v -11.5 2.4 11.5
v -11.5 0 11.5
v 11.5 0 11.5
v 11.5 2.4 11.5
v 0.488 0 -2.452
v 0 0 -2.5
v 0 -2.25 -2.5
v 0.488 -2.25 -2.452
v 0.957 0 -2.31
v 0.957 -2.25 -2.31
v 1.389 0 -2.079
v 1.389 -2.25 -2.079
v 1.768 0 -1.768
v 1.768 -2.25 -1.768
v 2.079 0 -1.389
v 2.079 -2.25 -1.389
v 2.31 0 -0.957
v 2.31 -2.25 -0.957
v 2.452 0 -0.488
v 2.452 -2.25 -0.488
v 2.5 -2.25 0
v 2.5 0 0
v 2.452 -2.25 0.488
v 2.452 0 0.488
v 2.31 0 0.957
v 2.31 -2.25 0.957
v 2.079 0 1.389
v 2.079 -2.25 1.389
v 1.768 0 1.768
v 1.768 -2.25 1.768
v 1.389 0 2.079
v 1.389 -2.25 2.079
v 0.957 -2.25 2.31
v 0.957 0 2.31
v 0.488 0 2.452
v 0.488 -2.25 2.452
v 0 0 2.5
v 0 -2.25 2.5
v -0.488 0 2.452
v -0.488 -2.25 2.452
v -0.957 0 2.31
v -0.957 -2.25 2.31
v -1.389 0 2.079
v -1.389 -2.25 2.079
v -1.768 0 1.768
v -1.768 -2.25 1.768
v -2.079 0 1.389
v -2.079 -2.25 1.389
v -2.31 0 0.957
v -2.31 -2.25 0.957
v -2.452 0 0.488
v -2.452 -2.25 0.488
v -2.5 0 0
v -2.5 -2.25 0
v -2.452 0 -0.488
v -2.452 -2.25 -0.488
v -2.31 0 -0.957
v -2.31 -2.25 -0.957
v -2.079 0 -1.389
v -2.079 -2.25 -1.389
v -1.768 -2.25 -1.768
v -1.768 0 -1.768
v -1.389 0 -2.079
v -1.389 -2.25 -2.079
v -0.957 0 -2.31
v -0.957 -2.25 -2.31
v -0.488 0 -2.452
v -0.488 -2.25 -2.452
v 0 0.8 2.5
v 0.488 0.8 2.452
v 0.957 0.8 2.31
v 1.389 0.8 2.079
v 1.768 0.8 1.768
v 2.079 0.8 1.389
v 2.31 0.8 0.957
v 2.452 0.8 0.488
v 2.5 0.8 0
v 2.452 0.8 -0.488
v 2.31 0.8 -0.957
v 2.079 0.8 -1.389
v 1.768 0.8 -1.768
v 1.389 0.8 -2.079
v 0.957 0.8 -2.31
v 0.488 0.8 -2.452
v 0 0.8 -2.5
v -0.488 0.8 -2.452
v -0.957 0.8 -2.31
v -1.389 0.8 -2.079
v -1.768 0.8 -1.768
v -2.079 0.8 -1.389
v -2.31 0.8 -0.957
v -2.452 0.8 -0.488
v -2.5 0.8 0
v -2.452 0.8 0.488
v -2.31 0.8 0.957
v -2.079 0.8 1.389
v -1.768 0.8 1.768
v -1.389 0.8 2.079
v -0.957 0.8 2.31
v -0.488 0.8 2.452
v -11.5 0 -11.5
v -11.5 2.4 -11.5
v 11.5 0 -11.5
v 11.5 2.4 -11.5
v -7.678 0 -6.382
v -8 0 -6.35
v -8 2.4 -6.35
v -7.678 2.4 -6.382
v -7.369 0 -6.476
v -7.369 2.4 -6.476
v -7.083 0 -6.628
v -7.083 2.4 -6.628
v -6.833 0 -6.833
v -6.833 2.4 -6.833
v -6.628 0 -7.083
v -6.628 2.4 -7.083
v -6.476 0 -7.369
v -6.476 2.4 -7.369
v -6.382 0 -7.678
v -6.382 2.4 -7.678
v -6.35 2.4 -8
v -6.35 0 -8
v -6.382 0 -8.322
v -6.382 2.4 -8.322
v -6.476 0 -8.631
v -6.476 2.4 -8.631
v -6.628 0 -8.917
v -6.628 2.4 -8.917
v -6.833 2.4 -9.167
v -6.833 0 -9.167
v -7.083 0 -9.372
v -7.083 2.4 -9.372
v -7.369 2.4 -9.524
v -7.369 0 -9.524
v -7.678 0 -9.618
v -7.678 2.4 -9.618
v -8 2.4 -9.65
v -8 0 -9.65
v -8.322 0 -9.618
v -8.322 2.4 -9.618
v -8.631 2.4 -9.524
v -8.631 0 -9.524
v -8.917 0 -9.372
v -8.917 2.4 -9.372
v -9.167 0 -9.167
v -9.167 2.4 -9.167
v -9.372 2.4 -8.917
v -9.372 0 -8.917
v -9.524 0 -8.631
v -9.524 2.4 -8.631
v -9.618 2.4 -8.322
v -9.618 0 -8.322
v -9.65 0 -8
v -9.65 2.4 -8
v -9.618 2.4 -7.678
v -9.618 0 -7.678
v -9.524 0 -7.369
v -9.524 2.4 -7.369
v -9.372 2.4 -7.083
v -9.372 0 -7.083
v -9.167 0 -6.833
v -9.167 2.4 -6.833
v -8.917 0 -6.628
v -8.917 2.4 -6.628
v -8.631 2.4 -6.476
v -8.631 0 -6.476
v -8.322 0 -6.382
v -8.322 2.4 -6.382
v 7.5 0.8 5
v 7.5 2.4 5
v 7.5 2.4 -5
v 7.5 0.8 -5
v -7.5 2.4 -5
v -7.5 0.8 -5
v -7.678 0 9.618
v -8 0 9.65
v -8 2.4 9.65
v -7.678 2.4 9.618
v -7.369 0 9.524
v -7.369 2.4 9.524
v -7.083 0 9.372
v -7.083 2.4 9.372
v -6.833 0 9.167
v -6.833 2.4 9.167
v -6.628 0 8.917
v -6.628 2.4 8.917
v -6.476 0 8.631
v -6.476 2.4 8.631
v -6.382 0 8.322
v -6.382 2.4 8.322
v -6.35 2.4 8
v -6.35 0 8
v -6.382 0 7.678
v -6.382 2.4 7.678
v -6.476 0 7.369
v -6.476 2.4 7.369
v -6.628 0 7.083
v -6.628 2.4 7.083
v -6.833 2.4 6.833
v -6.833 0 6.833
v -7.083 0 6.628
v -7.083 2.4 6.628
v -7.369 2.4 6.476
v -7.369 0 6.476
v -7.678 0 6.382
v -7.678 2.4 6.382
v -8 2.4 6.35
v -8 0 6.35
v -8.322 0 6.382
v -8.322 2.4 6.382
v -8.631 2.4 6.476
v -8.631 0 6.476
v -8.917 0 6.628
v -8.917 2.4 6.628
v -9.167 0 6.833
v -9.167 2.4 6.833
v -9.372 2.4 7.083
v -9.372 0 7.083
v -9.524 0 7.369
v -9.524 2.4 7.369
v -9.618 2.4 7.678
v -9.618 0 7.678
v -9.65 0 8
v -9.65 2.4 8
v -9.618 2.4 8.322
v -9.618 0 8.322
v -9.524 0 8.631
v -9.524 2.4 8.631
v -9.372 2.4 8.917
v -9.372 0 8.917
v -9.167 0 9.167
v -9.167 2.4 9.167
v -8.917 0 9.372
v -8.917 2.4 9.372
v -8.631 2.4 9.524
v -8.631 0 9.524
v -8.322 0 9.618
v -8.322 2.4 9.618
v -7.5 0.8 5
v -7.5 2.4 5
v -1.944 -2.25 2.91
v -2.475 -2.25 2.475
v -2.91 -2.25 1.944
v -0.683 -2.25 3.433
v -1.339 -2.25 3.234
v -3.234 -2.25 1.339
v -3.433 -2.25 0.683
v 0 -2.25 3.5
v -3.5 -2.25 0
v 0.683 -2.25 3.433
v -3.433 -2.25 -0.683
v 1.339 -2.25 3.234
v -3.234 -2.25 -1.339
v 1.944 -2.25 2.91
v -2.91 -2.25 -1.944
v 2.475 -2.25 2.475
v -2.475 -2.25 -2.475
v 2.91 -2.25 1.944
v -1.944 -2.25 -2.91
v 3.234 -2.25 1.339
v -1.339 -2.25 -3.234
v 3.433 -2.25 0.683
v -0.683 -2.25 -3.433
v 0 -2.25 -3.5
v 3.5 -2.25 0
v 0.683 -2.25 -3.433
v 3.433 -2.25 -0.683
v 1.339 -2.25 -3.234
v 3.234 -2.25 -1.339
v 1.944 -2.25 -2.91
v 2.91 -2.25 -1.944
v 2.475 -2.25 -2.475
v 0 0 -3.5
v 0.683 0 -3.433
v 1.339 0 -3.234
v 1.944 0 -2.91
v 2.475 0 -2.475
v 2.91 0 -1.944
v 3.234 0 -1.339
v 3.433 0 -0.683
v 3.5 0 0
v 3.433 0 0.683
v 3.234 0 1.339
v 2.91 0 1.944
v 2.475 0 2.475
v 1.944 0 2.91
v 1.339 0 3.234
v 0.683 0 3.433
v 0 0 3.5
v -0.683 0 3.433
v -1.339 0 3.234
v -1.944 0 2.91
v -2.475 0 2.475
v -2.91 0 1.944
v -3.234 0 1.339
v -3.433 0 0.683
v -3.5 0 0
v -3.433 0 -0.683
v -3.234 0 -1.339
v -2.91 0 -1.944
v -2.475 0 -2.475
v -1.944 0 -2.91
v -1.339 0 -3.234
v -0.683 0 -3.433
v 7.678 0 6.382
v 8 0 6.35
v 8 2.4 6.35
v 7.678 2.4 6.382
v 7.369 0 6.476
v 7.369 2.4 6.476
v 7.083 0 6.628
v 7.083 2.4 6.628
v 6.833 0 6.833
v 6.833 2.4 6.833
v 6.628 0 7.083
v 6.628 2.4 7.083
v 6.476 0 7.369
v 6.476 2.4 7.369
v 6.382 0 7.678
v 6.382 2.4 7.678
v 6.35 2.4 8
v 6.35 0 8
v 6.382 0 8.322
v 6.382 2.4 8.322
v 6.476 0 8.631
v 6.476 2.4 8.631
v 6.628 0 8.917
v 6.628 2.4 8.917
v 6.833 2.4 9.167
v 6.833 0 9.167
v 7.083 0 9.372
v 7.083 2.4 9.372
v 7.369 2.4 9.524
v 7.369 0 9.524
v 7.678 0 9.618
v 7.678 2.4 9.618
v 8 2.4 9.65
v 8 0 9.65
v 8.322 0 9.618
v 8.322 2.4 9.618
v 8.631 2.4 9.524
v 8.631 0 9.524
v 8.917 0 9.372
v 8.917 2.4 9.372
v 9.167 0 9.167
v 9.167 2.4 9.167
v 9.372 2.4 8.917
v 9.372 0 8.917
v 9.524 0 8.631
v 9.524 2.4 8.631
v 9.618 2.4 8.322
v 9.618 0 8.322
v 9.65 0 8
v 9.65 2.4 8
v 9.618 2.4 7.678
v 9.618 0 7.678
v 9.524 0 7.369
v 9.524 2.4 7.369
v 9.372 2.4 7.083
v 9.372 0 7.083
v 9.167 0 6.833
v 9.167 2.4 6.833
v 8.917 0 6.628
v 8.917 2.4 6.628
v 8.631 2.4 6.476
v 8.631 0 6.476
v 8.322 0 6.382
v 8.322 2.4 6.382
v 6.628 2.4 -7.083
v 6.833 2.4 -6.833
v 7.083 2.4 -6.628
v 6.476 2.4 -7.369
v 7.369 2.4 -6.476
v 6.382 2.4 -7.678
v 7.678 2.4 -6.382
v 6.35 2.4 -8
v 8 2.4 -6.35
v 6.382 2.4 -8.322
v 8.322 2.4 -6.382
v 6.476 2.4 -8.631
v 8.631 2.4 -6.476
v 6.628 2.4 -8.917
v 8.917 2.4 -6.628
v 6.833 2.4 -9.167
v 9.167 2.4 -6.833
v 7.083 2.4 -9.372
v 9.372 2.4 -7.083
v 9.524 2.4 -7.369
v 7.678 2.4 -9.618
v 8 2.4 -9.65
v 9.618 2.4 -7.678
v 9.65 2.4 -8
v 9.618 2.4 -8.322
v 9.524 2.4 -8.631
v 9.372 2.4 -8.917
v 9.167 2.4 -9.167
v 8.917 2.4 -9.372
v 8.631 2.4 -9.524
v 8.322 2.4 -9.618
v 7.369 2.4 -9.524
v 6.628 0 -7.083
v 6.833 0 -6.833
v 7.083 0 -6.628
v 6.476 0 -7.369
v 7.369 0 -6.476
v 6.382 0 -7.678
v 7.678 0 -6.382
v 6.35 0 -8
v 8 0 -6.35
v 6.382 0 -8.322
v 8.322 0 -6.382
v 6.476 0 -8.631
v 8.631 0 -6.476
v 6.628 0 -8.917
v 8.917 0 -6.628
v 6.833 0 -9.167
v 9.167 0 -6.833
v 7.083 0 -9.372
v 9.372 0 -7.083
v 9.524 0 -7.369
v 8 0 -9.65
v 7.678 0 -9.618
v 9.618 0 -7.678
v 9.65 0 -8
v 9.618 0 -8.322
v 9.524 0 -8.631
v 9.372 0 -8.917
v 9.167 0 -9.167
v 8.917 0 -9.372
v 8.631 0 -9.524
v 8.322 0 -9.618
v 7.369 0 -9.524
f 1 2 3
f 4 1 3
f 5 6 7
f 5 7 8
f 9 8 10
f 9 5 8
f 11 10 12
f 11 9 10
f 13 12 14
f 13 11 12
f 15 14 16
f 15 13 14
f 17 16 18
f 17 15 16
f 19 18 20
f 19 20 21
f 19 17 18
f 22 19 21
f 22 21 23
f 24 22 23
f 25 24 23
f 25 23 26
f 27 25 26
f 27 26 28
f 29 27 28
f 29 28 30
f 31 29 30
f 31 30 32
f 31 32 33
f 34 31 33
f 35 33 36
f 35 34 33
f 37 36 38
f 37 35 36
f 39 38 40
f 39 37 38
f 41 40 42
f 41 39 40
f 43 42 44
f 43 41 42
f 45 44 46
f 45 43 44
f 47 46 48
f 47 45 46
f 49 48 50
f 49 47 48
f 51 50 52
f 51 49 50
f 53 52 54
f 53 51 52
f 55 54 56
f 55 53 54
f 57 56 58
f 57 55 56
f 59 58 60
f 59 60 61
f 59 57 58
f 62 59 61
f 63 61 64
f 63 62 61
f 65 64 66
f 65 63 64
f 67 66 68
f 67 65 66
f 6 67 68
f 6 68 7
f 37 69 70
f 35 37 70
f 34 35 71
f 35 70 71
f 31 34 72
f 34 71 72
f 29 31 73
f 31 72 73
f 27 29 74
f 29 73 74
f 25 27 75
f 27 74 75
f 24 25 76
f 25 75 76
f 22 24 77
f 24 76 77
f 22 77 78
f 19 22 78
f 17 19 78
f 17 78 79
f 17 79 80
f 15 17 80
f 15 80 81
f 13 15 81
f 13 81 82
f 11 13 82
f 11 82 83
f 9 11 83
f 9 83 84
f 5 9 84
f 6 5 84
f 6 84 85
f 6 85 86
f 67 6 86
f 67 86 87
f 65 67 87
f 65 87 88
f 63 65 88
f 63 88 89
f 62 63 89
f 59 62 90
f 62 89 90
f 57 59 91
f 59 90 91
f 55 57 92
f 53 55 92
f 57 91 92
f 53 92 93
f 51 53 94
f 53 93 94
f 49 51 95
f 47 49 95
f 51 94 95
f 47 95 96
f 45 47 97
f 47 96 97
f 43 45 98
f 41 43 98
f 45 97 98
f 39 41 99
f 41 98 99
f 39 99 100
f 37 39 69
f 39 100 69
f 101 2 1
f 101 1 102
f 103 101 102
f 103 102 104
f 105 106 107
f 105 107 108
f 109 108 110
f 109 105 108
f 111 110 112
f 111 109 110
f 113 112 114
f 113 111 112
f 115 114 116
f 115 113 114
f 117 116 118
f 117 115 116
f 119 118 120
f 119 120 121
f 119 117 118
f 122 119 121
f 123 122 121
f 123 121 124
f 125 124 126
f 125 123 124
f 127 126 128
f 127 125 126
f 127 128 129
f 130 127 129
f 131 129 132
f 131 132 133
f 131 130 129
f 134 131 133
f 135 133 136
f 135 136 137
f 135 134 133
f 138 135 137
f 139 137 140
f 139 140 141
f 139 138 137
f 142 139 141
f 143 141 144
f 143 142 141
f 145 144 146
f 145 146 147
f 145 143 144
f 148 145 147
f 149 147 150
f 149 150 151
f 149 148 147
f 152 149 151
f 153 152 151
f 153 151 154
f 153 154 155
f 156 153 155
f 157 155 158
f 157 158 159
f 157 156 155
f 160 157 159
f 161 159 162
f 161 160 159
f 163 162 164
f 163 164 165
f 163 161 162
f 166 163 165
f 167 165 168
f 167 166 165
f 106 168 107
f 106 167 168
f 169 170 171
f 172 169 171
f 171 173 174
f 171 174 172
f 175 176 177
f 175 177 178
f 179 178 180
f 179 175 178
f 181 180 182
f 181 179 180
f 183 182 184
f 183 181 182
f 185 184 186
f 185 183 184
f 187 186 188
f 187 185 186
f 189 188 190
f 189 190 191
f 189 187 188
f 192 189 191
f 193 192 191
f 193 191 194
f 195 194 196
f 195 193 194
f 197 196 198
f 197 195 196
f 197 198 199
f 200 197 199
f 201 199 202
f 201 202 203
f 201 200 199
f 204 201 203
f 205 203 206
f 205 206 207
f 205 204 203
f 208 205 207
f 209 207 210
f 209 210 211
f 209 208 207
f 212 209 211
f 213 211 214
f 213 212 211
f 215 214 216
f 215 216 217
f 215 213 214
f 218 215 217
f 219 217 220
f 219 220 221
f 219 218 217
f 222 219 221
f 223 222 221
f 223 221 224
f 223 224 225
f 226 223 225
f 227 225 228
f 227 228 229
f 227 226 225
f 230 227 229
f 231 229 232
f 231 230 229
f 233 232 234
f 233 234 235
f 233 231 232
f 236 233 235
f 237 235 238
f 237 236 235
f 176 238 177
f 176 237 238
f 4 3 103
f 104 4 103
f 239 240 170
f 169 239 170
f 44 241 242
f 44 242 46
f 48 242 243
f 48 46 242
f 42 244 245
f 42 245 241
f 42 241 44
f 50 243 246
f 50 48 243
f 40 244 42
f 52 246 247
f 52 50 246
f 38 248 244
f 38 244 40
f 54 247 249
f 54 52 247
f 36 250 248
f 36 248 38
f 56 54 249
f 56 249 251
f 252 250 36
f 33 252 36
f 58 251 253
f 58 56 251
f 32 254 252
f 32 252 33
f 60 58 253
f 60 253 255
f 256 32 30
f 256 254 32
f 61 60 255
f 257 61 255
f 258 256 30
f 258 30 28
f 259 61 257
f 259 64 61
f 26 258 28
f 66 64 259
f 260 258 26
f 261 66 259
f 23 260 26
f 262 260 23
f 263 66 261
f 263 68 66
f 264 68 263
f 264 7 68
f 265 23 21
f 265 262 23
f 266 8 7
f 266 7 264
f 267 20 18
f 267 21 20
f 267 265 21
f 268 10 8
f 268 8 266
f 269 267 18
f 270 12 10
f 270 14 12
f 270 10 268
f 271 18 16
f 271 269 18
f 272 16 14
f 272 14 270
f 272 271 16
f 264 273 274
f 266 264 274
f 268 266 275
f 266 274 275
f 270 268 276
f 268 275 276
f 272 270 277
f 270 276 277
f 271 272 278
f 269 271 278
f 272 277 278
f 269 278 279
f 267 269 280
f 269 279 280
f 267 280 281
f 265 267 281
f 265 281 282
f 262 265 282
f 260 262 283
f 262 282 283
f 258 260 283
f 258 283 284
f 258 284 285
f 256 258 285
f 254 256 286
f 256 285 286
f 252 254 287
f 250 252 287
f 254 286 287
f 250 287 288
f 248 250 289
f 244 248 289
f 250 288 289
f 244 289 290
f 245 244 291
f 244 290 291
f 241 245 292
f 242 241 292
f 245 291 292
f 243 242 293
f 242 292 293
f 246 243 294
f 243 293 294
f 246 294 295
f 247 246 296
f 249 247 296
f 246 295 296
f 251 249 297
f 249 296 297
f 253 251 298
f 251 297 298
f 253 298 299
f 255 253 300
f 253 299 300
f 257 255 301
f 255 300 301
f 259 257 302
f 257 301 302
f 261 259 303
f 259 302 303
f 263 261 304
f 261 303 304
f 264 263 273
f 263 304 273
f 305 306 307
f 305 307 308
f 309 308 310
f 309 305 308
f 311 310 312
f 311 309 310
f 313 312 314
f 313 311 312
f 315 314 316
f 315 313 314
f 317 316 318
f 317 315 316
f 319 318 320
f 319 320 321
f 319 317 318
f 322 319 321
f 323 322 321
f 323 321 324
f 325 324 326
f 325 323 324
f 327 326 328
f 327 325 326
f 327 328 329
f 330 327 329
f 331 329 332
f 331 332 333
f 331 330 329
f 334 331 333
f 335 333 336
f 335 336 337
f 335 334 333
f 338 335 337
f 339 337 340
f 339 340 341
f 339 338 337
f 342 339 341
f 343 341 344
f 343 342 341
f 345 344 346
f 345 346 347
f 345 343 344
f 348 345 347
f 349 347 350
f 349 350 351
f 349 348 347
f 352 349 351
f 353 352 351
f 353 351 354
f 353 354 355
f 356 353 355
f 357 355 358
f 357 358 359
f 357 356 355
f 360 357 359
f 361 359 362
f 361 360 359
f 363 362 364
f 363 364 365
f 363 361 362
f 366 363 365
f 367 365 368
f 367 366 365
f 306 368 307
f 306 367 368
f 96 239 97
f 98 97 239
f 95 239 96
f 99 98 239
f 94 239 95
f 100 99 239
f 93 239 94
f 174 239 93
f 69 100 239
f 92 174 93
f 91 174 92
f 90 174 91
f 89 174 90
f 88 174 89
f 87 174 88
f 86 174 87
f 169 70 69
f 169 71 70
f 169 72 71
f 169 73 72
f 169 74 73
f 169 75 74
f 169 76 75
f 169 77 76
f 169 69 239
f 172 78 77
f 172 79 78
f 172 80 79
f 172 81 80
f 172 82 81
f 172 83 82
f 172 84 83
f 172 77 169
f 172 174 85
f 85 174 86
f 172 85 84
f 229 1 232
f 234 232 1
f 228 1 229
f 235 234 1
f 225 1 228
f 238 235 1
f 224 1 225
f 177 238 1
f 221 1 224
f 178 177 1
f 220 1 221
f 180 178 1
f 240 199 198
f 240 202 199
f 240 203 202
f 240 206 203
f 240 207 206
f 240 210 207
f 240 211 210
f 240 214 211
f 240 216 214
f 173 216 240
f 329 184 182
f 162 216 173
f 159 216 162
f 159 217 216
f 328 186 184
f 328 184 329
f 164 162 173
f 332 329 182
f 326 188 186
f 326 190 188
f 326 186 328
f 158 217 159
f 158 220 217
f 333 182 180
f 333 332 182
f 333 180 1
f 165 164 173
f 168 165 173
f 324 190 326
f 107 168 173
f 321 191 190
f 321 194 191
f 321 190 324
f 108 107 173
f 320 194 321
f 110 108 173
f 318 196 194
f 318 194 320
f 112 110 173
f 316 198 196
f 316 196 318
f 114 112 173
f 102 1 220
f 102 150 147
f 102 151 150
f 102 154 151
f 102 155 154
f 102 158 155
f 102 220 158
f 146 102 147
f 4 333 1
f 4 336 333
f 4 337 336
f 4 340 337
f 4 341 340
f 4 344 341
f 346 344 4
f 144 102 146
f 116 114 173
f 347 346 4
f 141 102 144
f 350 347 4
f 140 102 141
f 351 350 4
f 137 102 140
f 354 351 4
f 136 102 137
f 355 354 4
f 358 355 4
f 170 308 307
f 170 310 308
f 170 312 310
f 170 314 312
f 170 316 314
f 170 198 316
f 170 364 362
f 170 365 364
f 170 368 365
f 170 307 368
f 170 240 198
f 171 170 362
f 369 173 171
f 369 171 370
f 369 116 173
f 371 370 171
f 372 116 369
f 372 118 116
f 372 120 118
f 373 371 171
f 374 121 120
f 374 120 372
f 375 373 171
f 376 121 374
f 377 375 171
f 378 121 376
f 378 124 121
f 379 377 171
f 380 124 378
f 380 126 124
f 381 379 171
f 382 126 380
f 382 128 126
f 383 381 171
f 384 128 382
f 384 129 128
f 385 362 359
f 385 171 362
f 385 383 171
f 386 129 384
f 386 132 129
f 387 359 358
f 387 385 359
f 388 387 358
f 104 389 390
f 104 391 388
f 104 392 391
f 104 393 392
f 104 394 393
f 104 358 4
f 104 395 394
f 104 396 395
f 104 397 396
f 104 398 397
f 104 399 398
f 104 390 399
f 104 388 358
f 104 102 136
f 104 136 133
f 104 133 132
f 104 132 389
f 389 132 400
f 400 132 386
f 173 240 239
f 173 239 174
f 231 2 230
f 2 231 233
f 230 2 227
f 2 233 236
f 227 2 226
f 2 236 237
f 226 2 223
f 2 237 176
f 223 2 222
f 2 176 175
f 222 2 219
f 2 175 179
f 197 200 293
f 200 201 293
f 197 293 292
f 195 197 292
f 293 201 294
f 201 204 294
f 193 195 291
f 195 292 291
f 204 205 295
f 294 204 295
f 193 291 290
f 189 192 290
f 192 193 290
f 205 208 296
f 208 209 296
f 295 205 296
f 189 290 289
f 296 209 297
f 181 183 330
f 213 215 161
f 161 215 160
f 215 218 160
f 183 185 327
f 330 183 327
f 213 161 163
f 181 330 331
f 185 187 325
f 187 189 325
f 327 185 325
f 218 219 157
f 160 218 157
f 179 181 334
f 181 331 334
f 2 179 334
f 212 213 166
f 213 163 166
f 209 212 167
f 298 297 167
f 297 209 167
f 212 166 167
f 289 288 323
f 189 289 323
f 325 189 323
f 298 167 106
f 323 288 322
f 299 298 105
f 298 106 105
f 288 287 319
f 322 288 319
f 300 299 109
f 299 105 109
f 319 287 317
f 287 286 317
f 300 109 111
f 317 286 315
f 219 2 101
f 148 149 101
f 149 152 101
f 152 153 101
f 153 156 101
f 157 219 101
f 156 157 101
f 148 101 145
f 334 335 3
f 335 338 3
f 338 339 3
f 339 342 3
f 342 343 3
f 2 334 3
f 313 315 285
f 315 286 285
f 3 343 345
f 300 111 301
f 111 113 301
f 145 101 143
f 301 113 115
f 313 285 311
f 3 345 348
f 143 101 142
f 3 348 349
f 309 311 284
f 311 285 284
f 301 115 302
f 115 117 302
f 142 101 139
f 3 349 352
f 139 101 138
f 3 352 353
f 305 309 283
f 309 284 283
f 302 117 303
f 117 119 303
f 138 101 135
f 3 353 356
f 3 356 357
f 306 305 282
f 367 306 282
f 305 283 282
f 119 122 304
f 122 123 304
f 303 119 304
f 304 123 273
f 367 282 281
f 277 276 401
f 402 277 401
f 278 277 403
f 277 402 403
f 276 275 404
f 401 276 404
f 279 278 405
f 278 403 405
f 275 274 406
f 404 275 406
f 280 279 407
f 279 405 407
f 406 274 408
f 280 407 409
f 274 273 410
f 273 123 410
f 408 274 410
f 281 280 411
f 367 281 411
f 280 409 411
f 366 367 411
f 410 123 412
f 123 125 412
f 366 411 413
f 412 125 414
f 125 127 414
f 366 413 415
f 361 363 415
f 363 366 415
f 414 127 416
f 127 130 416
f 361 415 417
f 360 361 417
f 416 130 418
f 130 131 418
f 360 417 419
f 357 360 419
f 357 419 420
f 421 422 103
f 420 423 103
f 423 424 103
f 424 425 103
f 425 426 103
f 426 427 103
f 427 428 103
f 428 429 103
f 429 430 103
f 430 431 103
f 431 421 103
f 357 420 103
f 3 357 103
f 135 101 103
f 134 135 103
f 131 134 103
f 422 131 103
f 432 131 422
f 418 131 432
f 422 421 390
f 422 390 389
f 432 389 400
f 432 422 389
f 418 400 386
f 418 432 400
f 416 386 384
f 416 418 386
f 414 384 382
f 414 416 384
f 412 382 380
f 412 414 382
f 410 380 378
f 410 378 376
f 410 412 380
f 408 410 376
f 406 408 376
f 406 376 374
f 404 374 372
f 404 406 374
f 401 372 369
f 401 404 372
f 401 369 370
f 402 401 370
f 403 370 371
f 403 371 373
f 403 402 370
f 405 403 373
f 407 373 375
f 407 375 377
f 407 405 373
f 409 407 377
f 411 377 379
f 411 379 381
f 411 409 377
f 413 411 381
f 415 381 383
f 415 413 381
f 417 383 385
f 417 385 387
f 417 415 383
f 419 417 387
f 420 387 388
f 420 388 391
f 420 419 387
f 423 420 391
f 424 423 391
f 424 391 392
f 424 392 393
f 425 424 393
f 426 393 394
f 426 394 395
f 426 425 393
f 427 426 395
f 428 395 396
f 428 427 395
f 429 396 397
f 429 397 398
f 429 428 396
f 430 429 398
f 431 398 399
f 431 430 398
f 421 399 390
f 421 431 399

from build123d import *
from build123d.topology import SkipClean

# Parameters (mm, degrees)
SKETCH1_W           = 23
SKETCH1_H           = 23
SKETCH1_R           = 1.65
BOSS_EXTRUDE1_DEPTH = 2.4
CUT_EXTRUDE1_REACH  = 18.44
SKETCH2_R           = 2.5
SKETCH3_W           = 15
SKETCH3_H           = 10
CUT_EXTRUDE2_DEPTH  = 1.6
SKETCH4_R           = 3.5
SKETCH4_R_2         = 2.5
BOSS_EXTRUDE2_DEPTH = 2.25


with BuildPart() as part:
    # Sketch1 → Boss-Extrude1 (new body)
    with BuildSketch(Plane(origin=(0, 0, 0), x_dir=(1, 0, 0), z_dir=(0, 1, 0))):
        Rectangle(SKETCH1_W, SKETCH1_H)
        with Locations(Location((-8, 8, 0), (0, 0, 270))):
            Circle(SKETCH1_R, mode=Mode.SUBTRACT)
        with Locations(Location((8, -8, 0), (0, 0, 90))):
            Circle(SKETCH1_R, mode=Mode.SUBTRACT)
        with Locations(Location((-8, -8, 0), (0, 0, 270))):
            Circle(SKETCH1_R, mode=Mode.SUBTRACT)
        with Locations(Location((8, 8, 0), (0, 0, 90))):
            Circle(SKETCH1_R, mode=Mode.SUBTRACT)
    extrude(amount=BOSS_EXTRUDE1_DEPTH)

    # Sketch2 → Cut-Extrude1 (cut, up to next)
    with BuildSketch(Plane(origin=(0, 2.4, 0), x_dir=(1, 0, 0), z_dir=(0, 1, 0)), mode=Mode.PRIVATE) as cut_extrude1_sk1:
        with Locations(Location((0, 0, 0), (0, 0, 270))):
            Circle(SKETCH2_R)
    cut_extrude1_tool1 = extrude(cut_extrude1_sk1.sketch, amount=-CUT_EXTRUDE1_REACH, mode=Mode.PRIVATE) & part.part
    add(cut_extrude1_tool1.solids().sort_by_distance((0, 2.4, 0))[0], mode=Mode.SUBTRACT)

    # Sketch3 → Cut-Extrude2 (cut)
    with BuildSketch(Plane(origin=(0, 2.4, 0), x_dir=(1, 0, 0), z_dir=(0, 1, 0))):
        Rectangle(SKETCH3_W, SKETCH3_H)
    extrude(amount=-CUT_EXTRUDE2_DEPTH, mode=Mode.SUBTRACT)

    # Sketch4 → Boss-Extrude2 (add)
    with SkipClean():  # the faces are left unmerged after this step: merging them gives an invalid solid
        with BuildSketch(Plane.XZ):
            with Locations(Location((0, 0, 0), (0, 0, 270))):
                Circle(SKETCH4_R)
            with Locations(Location((0, 0, 0), (0, 0, 270))):
                Circle(SKETCH4_R_2, mode=Mode.SUBTRACT)
        extrude(amount=BOSS_EXTRUDE2_DEPTH)


solid = part.part
